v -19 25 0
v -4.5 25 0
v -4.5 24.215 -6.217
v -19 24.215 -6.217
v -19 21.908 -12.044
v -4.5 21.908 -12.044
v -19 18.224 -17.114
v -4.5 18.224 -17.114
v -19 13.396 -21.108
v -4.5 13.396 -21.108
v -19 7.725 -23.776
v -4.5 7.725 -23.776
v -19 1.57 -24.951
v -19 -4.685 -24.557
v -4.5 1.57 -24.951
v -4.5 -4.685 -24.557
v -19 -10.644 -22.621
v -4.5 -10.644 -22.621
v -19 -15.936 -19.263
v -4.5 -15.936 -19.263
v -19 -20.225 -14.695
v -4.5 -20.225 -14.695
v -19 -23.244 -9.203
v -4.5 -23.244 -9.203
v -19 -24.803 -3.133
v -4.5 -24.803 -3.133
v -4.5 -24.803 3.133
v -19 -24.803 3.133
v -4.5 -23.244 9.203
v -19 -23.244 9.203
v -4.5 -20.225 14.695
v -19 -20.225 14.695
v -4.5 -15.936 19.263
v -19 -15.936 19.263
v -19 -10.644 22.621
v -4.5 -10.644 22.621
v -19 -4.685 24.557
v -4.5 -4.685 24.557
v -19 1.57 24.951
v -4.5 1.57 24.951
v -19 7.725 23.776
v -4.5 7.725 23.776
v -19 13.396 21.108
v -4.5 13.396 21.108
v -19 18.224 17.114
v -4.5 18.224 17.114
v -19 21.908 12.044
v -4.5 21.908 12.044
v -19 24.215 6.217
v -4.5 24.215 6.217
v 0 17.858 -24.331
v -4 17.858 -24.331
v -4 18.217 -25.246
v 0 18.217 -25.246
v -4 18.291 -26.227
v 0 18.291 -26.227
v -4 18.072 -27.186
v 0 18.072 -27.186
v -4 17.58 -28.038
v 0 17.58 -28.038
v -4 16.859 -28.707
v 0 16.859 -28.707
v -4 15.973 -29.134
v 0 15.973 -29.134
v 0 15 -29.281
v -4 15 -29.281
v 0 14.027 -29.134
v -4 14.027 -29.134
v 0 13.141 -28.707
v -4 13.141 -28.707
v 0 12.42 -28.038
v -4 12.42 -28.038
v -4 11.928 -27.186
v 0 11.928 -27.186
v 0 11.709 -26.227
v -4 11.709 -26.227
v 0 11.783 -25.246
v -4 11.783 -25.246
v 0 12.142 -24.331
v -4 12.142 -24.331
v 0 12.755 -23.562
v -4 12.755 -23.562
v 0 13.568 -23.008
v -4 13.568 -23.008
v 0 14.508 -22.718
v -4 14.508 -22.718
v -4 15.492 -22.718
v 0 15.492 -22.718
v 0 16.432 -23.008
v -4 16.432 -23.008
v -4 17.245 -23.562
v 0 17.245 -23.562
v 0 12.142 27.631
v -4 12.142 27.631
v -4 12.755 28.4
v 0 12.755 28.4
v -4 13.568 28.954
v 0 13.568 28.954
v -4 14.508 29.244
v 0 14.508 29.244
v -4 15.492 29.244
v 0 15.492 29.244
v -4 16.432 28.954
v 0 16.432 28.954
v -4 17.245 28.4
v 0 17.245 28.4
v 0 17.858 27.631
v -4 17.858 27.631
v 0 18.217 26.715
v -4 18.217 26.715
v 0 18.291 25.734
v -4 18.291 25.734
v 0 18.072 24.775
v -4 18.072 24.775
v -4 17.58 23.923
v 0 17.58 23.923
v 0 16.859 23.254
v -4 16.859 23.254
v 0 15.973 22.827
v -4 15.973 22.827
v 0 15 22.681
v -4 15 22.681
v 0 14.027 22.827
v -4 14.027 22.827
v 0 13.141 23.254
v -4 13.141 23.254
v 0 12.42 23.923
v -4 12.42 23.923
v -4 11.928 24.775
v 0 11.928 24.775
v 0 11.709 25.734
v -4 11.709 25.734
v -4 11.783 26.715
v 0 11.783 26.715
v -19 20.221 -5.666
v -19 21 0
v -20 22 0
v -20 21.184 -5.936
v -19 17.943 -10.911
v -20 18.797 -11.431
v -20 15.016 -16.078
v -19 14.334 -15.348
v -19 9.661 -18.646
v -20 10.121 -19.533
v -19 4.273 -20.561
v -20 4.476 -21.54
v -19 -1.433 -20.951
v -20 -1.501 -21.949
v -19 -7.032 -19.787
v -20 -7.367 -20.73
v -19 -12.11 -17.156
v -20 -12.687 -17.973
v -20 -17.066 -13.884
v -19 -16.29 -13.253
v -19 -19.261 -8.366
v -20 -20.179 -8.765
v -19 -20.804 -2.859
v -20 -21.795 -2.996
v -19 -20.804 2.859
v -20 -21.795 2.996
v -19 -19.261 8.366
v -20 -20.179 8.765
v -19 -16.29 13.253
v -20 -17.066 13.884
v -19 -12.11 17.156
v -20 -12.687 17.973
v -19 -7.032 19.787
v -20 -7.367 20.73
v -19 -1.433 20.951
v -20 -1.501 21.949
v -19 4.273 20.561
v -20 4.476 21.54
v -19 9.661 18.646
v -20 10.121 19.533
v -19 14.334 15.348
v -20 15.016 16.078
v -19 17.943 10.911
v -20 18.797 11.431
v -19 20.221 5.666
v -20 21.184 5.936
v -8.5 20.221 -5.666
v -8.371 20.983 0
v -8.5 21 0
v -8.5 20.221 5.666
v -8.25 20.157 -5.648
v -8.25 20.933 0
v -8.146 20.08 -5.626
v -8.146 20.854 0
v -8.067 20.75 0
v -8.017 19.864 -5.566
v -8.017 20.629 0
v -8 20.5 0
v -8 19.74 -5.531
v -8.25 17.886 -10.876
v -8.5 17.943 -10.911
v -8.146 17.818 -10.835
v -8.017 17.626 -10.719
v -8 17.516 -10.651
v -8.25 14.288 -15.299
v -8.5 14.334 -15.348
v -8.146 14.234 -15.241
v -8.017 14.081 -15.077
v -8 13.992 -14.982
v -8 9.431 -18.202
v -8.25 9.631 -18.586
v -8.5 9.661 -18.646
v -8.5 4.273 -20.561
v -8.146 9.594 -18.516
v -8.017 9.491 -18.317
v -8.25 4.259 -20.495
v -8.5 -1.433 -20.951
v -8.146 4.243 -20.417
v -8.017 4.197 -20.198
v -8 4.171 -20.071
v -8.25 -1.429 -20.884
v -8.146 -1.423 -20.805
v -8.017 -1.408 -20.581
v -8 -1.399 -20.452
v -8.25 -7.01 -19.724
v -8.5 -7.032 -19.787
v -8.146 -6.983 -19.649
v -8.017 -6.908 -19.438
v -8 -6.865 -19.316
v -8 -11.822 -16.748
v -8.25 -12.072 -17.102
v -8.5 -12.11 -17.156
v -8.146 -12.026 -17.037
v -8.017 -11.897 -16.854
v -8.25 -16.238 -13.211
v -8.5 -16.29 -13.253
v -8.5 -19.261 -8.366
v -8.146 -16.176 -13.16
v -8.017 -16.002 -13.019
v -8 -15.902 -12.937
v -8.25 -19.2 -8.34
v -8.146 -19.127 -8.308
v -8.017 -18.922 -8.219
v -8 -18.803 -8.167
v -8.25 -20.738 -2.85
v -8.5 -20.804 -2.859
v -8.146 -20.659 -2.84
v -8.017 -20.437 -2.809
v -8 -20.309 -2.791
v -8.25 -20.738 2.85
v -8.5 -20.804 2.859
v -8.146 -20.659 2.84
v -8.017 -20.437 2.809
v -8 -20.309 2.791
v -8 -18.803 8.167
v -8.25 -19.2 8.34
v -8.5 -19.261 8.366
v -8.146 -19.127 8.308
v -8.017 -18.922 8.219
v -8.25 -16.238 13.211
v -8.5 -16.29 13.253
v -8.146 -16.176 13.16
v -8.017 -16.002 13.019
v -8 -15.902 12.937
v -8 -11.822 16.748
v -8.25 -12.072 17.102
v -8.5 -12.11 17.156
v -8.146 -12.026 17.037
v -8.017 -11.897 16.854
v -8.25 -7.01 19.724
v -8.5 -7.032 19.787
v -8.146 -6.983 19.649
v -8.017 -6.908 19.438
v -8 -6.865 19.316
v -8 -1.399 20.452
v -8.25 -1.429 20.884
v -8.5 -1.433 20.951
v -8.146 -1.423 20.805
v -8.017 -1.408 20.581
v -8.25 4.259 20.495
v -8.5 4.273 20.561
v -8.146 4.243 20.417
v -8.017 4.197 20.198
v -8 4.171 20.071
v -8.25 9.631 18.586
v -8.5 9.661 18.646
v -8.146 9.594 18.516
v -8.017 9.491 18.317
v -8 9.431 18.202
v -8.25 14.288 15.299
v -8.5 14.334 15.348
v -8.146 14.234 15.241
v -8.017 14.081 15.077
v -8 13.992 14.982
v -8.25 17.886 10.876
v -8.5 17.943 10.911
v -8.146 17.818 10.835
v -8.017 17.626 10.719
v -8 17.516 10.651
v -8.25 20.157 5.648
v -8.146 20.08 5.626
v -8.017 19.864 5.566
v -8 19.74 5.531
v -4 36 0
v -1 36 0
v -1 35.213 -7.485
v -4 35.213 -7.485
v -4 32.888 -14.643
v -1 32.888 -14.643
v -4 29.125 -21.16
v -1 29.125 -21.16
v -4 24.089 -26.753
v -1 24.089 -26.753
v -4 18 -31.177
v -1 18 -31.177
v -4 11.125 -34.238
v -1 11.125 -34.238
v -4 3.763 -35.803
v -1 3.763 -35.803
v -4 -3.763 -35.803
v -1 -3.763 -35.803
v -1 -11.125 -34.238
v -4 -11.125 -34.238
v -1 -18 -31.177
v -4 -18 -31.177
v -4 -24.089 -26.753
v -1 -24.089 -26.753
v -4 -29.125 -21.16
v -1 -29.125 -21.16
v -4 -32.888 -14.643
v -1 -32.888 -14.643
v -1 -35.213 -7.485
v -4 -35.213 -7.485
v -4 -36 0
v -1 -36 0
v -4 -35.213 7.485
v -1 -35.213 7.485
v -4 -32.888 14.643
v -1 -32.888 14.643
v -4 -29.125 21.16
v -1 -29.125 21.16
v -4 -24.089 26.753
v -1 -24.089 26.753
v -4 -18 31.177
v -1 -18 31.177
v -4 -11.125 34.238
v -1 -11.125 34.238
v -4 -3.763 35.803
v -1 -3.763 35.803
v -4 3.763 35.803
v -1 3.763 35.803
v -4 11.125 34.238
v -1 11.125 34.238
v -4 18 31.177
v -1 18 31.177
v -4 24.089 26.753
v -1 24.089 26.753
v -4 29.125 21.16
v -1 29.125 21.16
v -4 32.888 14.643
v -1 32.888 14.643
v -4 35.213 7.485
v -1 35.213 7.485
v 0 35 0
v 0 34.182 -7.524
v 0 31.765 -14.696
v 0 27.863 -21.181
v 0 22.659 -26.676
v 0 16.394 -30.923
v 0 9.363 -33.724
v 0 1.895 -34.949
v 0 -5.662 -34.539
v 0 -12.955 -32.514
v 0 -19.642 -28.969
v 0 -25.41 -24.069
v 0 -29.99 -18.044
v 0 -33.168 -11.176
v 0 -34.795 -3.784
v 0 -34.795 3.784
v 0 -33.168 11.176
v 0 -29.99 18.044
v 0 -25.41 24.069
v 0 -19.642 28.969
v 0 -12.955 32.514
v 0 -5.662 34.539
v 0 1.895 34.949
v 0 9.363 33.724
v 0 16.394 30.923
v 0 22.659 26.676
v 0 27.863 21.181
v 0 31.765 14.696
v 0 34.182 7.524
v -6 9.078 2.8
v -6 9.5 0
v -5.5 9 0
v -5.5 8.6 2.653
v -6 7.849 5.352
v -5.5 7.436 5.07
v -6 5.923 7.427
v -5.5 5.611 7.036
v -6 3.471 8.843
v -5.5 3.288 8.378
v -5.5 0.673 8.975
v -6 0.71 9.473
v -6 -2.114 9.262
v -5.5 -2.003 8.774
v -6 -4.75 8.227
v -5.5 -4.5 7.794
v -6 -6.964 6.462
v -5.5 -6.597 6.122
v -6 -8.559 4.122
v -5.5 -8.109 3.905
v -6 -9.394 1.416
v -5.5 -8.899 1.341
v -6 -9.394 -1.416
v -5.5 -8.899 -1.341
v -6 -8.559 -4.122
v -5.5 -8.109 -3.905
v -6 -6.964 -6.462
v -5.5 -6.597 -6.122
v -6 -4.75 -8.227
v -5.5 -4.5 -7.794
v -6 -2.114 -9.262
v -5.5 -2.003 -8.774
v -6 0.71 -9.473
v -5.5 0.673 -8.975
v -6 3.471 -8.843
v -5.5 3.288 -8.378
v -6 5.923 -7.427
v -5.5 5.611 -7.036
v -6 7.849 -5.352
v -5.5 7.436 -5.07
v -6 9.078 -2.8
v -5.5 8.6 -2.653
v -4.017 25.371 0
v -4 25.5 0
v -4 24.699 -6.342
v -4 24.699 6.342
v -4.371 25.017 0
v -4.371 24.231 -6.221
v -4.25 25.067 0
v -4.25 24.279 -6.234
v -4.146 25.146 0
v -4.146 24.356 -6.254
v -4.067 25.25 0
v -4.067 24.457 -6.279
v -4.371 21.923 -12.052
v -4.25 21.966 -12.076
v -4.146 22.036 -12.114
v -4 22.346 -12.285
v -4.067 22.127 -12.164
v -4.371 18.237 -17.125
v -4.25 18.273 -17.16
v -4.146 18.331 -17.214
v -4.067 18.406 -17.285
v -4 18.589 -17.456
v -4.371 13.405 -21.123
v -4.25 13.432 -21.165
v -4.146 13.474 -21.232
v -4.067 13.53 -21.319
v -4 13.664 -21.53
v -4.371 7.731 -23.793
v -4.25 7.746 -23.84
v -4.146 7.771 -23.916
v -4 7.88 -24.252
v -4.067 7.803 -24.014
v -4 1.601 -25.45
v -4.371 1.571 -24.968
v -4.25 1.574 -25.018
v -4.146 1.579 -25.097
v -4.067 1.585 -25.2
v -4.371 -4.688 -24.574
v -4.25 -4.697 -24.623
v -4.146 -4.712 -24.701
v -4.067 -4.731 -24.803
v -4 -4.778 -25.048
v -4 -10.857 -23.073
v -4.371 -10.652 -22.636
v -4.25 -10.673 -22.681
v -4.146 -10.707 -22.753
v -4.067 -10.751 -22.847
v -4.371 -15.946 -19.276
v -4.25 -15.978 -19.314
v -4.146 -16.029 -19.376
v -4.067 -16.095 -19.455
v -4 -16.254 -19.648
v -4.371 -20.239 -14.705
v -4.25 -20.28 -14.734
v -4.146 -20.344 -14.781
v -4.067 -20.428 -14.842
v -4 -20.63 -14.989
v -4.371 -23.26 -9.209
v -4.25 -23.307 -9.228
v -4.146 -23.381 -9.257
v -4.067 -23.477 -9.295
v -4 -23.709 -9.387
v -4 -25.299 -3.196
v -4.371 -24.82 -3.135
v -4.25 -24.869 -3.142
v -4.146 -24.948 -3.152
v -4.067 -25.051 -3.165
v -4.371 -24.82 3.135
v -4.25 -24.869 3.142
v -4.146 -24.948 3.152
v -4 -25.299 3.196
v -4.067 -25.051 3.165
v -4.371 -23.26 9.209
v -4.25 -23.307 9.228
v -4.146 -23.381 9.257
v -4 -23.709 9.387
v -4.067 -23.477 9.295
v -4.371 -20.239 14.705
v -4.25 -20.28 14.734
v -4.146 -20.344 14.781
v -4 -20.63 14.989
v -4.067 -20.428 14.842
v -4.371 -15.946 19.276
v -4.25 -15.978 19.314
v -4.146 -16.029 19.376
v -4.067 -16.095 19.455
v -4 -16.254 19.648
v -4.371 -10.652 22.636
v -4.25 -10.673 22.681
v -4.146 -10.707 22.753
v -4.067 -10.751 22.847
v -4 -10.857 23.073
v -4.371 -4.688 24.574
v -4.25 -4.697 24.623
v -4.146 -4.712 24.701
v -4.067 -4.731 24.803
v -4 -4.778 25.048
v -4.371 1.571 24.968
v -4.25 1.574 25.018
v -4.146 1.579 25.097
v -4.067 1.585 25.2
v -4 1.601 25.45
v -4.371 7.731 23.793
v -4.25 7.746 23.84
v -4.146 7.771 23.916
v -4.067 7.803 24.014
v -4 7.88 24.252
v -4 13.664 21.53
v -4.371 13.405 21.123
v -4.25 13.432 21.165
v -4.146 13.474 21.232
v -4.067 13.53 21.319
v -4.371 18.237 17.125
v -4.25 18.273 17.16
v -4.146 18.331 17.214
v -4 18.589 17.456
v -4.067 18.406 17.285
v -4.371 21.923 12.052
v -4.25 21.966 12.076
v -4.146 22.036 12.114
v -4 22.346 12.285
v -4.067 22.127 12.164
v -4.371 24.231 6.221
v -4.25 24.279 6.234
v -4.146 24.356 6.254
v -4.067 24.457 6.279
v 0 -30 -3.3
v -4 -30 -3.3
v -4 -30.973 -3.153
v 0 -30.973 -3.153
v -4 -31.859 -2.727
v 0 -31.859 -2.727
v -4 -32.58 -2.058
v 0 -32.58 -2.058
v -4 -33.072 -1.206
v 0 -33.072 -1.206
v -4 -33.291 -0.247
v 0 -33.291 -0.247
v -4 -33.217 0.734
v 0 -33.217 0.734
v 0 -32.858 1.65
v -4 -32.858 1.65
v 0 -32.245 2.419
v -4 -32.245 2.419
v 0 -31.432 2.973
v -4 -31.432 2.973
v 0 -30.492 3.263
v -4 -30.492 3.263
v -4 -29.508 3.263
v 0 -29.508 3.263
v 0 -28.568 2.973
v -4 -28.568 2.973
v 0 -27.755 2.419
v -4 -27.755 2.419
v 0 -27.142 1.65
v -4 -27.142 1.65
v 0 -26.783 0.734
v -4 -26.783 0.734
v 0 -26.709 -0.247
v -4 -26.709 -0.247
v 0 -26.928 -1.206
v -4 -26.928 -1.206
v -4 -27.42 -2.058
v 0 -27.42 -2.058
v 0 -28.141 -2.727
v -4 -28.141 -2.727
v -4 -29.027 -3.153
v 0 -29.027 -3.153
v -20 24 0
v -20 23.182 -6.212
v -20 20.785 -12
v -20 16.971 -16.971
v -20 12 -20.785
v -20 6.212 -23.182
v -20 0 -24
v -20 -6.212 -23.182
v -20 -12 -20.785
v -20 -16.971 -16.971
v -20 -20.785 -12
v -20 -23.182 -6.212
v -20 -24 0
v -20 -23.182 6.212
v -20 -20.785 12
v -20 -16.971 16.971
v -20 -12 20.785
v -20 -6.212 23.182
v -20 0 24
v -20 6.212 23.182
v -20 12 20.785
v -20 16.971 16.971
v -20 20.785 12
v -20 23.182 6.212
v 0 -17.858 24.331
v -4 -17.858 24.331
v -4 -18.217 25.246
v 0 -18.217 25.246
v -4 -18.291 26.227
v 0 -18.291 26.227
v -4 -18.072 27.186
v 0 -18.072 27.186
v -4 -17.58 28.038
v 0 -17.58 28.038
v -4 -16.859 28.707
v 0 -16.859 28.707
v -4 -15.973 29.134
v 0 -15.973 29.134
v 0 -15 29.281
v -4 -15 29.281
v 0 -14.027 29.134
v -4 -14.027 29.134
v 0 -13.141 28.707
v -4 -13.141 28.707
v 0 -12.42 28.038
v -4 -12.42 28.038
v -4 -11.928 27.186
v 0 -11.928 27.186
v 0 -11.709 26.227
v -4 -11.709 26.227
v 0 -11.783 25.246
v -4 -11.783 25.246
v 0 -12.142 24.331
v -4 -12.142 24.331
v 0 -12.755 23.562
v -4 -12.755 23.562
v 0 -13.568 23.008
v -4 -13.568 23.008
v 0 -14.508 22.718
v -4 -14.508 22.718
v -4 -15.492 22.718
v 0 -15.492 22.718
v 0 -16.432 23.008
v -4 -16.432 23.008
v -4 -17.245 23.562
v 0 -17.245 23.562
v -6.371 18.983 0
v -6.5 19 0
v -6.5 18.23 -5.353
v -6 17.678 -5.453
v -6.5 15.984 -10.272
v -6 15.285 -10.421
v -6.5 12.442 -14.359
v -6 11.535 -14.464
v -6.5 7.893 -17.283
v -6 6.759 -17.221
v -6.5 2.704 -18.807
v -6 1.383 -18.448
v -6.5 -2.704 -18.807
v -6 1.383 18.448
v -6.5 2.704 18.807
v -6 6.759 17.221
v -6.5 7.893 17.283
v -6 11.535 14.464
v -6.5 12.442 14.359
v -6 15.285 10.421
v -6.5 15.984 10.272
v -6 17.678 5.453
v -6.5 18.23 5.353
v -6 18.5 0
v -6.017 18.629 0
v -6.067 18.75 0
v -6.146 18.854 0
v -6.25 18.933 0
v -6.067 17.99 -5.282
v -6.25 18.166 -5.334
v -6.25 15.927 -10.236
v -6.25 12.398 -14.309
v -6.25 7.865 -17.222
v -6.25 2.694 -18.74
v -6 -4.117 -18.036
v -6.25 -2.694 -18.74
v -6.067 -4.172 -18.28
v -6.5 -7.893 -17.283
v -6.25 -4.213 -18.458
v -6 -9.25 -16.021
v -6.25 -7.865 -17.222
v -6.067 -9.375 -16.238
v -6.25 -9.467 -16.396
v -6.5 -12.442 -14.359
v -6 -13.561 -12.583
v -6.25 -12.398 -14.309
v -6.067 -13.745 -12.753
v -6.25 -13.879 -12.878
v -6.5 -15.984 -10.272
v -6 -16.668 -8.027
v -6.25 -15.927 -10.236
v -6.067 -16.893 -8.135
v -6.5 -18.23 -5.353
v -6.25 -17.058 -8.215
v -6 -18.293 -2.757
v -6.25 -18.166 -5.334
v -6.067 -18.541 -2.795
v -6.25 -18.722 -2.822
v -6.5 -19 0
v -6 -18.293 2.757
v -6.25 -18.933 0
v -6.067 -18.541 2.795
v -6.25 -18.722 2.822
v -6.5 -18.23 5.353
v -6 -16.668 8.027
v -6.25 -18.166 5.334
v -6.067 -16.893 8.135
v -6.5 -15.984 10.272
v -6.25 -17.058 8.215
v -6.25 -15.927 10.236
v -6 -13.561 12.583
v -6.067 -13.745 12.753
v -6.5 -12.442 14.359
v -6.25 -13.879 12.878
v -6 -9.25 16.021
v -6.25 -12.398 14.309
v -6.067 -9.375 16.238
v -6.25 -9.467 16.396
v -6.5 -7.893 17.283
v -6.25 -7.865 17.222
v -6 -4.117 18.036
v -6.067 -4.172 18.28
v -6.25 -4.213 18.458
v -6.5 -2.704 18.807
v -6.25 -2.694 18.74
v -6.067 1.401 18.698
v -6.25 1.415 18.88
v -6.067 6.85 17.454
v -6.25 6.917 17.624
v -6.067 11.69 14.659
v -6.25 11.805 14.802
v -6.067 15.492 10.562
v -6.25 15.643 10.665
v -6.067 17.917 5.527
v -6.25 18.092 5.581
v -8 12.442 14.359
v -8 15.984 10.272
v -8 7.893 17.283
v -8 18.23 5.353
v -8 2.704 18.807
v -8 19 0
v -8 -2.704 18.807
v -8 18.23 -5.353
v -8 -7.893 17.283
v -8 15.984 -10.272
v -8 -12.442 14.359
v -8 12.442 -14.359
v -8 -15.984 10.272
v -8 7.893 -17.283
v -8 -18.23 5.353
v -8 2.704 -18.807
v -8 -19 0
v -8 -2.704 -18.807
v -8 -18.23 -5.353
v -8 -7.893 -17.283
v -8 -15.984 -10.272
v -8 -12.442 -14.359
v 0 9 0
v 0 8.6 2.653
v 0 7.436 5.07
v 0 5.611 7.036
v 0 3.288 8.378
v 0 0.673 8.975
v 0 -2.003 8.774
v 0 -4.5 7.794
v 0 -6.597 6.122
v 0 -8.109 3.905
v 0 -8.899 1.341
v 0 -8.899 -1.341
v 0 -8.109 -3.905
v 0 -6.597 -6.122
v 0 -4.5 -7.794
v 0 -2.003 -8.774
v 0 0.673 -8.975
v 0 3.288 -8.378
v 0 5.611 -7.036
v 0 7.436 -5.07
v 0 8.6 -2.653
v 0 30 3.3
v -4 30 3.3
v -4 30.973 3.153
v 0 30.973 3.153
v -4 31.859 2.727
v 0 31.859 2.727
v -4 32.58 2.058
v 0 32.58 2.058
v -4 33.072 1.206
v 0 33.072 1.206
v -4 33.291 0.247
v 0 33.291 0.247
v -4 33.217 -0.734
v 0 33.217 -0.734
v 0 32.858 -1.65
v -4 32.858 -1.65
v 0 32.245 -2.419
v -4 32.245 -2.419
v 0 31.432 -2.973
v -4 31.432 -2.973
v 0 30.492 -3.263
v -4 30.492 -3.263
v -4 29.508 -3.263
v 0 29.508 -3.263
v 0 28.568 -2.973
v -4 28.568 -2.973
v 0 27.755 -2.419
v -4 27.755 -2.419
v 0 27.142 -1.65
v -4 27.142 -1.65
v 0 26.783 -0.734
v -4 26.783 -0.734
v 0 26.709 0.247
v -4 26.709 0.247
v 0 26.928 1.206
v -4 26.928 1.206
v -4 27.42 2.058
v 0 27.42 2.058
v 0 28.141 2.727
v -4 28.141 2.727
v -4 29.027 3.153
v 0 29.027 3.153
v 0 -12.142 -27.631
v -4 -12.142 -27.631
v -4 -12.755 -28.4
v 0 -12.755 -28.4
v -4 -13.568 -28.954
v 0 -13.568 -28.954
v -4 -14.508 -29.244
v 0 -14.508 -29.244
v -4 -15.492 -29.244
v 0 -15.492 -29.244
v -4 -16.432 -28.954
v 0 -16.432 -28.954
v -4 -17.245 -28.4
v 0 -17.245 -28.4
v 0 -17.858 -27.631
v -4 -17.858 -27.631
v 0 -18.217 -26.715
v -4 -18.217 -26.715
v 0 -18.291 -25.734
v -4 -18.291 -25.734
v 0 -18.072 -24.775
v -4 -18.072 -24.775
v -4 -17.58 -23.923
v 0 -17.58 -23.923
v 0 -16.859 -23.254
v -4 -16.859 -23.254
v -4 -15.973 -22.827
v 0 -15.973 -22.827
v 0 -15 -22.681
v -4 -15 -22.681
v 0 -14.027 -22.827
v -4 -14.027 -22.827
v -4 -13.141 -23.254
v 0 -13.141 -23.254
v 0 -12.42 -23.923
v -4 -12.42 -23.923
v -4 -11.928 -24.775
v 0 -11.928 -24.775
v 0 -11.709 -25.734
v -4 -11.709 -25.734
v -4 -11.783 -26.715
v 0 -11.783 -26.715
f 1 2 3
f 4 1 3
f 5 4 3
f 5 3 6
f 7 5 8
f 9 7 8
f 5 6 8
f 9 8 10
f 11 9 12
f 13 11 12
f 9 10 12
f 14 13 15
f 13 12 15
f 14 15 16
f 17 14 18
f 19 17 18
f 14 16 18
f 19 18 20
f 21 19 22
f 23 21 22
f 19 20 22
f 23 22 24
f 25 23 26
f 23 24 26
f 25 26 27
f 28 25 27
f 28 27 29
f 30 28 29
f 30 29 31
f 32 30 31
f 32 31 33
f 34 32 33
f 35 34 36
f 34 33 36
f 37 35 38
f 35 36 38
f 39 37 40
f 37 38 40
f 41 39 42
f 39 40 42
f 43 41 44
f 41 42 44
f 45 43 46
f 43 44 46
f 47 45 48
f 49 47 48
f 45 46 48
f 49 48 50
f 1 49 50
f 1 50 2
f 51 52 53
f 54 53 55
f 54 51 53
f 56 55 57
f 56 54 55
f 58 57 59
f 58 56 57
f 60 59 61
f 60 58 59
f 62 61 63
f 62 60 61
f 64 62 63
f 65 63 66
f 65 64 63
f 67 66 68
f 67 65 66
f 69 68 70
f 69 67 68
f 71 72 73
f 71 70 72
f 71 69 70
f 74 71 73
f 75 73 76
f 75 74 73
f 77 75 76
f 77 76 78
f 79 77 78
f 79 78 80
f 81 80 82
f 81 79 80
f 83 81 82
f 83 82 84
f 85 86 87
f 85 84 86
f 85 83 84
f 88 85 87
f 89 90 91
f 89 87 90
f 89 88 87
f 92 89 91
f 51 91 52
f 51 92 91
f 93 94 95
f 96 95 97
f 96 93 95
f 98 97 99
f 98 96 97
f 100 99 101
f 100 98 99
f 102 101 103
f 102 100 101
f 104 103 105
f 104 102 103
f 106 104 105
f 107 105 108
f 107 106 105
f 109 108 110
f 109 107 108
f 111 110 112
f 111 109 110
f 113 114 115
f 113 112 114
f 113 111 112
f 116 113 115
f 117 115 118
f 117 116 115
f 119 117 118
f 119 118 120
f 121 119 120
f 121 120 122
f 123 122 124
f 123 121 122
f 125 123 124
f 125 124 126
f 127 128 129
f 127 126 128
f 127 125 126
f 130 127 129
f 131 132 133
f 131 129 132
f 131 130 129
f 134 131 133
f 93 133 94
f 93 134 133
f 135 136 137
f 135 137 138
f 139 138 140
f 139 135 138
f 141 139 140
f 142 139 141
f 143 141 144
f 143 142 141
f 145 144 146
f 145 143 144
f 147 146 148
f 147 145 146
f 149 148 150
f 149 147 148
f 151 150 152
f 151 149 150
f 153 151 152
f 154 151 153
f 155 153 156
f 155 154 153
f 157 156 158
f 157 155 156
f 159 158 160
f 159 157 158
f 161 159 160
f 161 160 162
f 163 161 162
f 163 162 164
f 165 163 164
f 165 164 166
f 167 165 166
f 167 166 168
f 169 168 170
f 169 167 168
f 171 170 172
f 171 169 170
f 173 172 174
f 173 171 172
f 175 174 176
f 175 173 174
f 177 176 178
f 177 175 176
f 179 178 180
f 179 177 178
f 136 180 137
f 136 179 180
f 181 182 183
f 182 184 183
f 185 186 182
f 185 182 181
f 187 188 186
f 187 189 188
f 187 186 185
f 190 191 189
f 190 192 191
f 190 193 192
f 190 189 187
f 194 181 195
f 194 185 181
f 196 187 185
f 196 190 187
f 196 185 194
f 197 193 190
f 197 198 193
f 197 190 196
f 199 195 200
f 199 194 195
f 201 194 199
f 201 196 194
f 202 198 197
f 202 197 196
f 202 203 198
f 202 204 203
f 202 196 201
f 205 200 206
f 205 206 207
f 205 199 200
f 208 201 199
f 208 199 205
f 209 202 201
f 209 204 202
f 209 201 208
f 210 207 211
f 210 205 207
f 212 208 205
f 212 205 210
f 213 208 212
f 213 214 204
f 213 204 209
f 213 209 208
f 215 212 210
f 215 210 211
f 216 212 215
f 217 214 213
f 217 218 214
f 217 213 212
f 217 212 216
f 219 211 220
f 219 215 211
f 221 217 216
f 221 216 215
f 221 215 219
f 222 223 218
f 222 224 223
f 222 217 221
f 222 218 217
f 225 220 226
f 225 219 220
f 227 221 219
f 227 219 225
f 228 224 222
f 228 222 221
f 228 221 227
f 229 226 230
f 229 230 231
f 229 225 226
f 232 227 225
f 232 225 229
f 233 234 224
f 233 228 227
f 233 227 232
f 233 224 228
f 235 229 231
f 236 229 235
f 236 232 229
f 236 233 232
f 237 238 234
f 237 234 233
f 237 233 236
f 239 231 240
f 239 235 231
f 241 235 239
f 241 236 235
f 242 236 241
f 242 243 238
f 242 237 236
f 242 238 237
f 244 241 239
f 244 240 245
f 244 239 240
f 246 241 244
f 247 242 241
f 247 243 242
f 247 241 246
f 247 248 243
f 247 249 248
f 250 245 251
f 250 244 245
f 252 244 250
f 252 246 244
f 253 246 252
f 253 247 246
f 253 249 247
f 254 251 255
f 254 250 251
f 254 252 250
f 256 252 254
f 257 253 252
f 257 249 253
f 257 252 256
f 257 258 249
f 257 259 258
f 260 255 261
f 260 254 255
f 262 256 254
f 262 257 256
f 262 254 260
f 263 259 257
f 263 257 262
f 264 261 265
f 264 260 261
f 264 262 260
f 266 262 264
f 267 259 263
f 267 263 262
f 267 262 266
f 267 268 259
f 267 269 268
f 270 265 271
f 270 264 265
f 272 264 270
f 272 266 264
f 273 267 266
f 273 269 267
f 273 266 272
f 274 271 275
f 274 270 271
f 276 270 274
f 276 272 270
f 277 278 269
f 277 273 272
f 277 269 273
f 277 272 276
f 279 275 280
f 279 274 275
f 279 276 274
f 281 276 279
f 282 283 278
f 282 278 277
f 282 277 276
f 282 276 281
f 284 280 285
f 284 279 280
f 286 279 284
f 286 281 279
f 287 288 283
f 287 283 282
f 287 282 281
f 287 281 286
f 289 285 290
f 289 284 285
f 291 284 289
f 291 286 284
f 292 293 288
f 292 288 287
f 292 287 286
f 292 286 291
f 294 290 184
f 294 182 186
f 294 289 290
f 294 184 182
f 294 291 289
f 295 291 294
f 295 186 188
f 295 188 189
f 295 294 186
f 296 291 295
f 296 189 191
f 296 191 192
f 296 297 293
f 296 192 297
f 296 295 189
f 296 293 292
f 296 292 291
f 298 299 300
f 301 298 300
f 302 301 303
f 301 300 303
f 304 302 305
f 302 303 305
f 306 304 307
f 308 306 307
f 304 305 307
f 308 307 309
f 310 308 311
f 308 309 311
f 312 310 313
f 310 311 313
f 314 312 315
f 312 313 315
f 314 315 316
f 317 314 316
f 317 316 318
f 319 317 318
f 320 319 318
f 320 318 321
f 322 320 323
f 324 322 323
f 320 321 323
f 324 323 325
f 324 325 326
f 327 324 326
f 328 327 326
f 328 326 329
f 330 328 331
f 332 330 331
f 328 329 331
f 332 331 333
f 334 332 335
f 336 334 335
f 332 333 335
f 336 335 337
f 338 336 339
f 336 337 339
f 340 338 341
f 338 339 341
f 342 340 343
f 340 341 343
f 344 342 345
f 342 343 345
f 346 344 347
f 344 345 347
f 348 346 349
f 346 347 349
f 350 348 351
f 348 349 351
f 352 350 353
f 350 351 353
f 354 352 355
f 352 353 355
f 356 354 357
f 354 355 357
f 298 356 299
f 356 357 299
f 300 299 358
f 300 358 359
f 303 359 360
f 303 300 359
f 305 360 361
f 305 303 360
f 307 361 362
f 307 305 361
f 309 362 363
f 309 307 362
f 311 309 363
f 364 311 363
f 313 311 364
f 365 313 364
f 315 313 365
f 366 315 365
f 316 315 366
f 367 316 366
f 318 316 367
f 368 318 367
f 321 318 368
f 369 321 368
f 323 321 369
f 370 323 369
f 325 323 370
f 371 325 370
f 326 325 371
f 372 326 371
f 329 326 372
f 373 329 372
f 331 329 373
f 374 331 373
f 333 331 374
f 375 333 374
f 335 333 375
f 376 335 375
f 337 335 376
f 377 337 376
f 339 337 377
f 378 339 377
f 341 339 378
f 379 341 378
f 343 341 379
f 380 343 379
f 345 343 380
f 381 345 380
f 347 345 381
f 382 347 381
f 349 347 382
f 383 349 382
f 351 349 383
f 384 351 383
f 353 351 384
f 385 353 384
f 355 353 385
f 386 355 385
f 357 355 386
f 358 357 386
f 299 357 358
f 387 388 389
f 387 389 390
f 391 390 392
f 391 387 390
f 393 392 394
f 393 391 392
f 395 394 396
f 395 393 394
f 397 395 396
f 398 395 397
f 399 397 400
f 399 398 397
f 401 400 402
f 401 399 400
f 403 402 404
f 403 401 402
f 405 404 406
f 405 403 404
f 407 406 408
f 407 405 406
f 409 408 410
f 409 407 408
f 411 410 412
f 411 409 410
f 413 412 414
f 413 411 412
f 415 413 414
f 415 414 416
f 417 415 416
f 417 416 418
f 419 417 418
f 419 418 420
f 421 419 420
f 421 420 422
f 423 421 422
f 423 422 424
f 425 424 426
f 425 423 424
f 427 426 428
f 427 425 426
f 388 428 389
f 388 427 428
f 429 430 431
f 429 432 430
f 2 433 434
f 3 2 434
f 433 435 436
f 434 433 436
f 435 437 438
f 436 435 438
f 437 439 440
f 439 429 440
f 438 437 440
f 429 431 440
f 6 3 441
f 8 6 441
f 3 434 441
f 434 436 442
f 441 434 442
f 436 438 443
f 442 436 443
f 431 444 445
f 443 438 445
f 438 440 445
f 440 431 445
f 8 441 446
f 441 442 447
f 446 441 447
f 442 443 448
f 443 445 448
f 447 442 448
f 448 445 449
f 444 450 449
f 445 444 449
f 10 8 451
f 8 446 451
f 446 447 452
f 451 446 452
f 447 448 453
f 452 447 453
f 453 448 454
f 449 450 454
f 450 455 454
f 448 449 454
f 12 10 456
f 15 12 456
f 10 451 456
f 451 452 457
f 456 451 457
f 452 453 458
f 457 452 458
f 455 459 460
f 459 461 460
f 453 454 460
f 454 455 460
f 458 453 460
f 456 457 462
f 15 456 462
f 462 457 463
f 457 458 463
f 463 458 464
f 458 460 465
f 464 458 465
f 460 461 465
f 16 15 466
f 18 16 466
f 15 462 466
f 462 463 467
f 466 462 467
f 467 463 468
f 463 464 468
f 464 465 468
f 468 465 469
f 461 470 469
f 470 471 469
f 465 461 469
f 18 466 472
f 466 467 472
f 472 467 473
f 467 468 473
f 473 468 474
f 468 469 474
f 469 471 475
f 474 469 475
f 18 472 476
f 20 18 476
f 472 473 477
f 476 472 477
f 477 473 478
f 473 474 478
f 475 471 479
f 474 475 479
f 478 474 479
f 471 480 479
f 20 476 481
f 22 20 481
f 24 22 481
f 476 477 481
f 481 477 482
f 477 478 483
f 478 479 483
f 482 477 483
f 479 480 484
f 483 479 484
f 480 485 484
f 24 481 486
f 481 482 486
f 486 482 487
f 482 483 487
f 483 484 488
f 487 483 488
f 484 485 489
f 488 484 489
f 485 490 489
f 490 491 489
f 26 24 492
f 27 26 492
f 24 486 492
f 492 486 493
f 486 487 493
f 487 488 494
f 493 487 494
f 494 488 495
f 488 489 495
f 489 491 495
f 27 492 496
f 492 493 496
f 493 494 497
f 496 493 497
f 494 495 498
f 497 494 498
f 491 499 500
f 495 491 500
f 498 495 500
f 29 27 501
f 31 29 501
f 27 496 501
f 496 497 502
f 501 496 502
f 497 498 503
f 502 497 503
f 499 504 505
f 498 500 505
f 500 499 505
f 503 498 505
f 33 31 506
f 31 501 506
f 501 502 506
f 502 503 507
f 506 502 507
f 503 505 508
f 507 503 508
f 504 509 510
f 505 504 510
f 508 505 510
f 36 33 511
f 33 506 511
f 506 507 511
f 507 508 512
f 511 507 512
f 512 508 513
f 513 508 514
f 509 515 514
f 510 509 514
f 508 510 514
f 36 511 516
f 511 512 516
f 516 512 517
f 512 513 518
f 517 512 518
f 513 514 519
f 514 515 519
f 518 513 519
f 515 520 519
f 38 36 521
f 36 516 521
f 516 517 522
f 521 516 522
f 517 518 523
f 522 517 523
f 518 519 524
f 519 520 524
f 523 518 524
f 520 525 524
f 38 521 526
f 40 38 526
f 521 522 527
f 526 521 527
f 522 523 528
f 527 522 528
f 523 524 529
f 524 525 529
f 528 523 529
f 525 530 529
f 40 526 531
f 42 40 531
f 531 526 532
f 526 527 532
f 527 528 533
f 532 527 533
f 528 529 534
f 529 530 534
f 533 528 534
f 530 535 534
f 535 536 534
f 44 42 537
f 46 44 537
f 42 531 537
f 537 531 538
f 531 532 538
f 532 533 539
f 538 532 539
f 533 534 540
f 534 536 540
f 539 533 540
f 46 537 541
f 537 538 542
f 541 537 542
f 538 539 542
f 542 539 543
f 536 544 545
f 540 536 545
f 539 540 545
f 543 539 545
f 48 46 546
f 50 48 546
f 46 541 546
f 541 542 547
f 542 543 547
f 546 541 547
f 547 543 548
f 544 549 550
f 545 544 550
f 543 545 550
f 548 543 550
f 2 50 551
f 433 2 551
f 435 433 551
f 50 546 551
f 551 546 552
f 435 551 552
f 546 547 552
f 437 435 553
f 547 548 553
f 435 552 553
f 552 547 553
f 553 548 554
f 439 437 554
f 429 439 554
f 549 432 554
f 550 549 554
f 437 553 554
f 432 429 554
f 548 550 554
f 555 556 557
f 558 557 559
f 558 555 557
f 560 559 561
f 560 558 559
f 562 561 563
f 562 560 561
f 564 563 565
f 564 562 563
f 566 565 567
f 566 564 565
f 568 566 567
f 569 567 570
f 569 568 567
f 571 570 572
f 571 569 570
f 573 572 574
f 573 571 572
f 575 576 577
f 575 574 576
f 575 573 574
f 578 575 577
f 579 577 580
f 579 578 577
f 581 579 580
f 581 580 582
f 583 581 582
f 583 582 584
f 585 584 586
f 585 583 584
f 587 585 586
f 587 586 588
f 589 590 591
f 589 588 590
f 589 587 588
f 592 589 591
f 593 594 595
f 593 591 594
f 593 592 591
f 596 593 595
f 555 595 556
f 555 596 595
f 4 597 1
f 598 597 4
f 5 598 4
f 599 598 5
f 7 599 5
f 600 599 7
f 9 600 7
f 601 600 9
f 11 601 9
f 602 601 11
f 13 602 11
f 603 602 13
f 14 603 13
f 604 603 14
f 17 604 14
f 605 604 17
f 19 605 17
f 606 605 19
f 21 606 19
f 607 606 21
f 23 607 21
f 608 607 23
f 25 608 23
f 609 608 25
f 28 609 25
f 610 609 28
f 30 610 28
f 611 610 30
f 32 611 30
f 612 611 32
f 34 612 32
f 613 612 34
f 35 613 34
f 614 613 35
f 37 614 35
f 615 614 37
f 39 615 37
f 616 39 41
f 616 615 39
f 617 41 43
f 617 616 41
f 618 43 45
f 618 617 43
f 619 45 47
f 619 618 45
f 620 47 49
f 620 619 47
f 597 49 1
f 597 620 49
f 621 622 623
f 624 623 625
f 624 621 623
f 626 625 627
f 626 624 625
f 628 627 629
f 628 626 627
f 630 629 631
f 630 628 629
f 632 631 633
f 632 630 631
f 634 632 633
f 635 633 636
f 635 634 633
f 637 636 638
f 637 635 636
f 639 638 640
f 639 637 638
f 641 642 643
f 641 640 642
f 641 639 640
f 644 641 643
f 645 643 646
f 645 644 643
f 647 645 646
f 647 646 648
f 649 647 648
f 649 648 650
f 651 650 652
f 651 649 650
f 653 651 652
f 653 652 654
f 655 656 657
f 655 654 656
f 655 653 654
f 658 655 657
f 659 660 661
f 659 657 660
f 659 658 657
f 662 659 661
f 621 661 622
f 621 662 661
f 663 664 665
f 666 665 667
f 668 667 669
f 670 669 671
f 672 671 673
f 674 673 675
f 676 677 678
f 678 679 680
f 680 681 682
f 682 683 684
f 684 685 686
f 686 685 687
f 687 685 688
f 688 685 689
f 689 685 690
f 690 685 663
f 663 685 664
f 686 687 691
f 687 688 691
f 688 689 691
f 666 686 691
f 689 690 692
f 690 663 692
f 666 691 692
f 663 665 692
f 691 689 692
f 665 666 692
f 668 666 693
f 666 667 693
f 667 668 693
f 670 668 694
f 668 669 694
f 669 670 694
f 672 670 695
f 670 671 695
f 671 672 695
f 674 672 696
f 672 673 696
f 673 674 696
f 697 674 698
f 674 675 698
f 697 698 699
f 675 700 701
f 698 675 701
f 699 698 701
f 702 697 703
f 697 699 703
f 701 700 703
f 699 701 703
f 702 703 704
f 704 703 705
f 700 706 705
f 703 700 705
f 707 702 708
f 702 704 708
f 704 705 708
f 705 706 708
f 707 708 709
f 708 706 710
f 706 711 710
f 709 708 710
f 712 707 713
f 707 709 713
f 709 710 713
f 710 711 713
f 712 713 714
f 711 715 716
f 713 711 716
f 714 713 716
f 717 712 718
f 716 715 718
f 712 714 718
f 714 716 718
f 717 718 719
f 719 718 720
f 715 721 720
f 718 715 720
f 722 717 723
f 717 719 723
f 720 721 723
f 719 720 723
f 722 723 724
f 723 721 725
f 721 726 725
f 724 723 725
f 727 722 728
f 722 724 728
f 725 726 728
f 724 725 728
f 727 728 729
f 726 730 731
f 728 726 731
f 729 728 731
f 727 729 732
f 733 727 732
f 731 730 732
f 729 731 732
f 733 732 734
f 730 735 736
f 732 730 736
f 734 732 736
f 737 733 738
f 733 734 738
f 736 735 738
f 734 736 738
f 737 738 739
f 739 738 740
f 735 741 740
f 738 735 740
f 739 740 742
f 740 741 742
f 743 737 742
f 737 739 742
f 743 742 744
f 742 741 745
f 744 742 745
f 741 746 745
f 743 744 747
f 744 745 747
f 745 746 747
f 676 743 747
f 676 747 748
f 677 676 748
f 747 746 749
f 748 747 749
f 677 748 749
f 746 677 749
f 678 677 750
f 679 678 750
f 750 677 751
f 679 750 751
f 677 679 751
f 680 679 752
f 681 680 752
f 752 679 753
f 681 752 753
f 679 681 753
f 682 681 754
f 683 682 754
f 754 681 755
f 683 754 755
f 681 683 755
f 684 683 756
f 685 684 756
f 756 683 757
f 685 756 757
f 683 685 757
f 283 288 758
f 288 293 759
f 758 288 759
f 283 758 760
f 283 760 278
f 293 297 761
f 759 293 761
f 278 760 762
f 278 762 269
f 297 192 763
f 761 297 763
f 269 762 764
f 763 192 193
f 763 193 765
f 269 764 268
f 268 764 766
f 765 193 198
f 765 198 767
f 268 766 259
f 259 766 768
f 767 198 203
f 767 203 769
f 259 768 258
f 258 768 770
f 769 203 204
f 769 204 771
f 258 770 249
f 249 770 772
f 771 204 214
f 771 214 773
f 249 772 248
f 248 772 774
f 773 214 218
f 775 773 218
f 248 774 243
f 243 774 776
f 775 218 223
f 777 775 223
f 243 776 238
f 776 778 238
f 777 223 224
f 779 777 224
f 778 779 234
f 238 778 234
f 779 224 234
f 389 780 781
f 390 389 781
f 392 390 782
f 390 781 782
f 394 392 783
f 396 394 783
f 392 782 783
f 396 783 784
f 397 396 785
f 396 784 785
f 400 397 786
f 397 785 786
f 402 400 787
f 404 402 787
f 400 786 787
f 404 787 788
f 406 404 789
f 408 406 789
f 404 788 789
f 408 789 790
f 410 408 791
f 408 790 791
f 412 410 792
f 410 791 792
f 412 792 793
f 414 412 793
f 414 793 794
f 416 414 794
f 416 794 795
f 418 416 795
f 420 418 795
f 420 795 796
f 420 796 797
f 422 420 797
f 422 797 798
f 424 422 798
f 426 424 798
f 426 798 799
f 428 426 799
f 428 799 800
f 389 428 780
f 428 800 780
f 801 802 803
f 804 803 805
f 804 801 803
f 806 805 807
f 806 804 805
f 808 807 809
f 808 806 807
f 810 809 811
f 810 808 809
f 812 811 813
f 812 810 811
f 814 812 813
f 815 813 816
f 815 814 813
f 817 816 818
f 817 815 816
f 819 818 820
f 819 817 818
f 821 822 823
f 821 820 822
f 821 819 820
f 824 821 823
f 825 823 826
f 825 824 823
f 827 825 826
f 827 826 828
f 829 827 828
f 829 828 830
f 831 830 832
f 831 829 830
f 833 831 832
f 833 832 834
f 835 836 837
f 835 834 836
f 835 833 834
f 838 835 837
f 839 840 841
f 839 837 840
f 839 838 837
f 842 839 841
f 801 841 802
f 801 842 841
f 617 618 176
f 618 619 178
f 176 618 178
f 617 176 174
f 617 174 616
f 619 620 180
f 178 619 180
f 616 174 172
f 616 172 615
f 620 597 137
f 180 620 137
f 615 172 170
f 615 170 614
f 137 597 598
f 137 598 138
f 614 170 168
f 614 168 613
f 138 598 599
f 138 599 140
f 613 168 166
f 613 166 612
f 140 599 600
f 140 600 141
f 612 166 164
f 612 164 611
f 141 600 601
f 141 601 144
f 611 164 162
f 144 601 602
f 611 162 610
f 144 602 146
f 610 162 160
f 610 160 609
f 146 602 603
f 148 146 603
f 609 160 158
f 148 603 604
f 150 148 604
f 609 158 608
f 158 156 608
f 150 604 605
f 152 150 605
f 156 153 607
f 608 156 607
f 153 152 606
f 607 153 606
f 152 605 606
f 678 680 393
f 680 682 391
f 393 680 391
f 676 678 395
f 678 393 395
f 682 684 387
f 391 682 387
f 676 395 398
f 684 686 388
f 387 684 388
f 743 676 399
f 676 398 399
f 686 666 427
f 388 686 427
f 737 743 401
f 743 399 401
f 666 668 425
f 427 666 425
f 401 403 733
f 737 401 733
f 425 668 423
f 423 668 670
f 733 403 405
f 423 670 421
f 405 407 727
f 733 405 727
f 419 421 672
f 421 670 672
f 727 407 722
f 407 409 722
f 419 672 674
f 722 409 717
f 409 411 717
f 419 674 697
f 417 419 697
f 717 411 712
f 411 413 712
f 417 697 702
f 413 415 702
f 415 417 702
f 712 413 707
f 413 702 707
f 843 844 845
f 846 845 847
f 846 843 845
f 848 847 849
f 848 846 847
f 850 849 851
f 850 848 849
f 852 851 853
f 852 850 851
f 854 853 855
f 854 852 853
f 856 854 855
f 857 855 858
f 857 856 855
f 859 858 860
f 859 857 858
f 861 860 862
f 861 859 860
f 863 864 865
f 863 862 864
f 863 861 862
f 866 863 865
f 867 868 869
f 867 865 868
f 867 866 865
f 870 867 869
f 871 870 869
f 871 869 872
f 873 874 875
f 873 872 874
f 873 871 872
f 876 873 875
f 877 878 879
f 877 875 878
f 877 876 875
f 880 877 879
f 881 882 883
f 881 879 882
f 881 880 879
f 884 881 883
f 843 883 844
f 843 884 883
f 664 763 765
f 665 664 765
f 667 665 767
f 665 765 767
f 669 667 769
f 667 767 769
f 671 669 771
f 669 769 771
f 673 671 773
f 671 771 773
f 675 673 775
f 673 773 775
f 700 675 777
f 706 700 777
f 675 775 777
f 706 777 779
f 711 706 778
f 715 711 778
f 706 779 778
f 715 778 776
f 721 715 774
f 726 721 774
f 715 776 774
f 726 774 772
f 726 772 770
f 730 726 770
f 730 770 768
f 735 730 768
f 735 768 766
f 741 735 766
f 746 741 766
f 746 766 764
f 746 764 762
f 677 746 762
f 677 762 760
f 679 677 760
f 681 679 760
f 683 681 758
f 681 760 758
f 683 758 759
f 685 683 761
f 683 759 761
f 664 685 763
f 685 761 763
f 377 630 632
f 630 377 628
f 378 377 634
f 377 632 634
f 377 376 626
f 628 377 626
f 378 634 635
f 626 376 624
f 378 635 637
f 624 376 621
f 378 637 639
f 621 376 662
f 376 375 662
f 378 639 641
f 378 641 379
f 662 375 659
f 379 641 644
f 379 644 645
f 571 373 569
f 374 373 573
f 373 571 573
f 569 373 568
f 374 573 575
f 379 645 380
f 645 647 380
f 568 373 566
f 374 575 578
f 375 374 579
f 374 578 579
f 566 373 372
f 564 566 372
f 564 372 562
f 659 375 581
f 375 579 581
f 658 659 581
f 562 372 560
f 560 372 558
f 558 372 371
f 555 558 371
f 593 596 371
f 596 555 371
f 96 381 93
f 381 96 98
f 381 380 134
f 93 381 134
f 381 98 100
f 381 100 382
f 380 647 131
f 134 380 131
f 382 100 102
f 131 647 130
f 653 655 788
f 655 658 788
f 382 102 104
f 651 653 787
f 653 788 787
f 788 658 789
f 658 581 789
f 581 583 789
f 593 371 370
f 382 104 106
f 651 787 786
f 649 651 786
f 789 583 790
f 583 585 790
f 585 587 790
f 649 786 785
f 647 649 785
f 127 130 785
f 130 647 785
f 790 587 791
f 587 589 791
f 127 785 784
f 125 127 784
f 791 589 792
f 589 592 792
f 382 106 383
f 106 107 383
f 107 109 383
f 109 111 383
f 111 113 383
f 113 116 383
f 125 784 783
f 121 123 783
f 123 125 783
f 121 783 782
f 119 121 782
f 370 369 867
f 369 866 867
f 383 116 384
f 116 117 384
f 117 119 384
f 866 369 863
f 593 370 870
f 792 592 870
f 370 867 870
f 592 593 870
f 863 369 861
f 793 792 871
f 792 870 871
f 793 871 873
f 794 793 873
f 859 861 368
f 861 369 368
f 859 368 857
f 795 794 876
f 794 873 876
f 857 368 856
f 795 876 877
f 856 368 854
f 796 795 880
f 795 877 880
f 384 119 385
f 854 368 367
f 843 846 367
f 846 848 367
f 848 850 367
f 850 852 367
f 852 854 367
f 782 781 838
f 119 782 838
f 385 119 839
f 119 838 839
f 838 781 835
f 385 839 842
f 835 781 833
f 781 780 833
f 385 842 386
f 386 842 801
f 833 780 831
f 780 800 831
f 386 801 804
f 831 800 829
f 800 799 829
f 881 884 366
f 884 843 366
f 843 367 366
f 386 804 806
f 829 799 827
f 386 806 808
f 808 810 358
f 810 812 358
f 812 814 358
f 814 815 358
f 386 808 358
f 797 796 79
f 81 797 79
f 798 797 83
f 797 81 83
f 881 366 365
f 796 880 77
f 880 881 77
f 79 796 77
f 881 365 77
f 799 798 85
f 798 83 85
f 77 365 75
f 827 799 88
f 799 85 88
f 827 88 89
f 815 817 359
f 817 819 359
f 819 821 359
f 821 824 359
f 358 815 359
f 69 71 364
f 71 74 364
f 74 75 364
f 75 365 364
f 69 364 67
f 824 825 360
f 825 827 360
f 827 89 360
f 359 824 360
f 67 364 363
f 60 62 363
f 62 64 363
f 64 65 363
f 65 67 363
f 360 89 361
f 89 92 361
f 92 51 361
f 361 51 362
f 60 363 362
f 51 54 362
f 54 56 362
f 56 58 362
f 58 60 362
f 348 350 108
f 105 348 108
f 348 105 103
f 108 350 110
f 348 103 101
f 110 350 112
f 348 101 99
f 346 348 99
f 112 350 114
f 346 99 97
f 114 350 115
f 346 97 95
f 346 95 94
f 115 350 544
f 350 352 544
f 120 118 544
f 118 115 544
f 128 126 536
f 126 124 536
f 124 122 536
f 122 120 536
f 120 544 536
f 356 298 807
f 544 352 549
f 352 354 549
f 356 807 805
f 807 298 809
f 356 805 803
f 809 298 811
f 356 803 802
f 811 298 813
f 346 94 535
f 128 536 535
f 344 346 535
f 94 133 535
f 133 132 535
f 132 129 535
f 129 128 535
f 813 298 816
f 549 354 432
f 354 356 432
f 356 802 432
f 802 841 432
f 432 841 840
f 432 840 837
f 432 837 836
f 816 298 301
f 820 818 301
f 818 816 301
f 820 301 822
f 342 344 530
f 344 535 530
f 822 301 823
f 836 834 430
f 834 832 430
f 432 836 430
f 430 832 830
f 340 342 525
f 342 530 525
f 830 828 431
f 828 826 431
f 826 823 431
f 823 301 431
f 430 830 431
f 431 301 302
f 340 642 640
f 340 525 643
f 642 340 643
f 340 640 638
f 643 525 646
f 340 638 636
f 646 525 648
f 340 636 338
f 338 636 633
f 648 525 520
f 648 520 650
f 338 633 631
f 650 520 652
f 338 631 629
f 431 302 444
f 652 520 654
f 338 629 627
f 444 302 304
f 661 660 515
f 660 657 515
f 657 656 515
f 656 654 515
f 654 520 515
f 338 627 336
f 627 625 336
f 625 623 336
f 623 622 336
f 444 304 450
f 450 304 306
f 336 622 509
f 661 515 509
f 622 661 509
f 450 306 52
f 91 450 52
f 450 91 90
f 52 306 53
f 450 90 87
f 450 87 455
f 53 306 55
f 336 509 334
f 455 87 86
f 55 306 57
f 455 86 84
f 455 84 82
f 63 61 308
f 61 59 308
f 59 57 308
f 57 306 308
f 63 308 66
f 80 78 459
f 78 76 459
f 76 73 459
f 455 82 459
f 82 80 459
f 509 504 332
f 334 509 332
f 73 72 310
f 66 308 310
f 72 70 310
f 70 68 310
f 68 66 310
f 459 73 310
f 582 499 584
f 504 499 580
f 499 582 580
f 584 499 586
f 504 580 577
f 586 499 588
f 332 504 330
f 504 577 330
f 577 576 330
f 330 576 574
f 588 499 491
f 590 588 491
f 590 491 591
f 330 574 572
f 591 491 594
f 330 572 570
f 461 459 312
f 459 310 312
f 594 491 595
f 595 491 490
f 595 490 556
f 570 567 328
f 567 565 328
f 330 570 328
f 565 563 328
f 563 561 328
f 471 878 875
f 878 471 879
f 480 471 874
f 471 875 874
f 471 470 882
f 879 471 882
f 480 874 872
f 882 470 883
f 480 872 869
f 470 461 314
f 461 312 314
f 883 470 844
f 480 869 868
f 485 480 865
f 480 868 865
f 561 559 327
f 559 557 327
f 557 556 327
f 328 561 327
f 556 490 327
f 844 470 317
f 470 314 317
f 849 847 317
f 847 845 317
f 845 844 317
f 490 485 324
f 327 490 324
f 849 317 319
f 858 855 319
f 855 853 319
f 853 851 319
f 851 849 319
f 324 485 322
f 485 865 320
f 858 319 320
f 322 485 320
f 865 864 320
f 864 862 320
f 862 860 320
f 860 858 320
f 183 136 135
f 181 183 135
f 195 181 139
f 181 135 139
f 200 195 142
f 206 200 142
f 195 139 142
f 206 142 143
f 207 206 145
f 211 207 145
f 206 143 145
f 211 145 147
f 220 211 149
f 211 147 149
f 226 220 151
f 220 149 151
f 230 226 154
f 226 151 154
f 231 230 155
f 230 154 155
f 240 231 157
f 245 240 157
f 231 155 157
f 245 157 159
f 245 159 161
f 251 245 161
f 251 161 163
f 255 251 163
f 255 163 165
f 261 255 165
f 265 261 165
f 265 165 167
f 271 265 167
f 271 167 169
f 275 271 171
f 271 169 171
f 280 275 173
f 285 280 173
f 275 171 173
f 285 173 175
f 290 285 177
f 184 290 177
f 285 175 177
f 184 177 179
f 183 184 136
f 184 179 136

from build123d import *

# Parameters (mm, degrees)
SKETCH_2_W               = 20
SKETCH_2_H               = 9
CHAMFER_1_SIZE           = 1
FILLET_1_R               = 0.5
CHAMFER_2_SIZE           = 0.5
CHAMFER_3_SIZE           = 1
PATTERN_CIRCULAR_1_COUNT = 6


with BuildPart() as part:
    # Эскиз1 → Повернуть1 (revolve)
    with BuildSketch(Plane.XY):
        Polygon((0, 36), (0, 0), (-6, 0), (-6, 19), (-8, 19), (-8, 21), (-20, 21), (-20, 25), (-4, 25), (-4, 36), align=None)
    revolve(axis=Axis((0, 0, 0), (-1, 0, 0)))

    # Эскиз2 → Вырез-Повернуть1 (revolve, cut)
    with BuildSketch(Plane.XY):
        with Locations((-10, 4.5)):
            Rectangle(SKETCH_2_W, SKETCH_2_H)
    revolve(axis=Axis((0, 0, 0), (1, 0, 0)), mode=Mode.SUBTRACT)

    # Фаска1
    chamfer_1_edges = [part.edges().sort_by_distance(p)[0] for p in [
        (-20, -25, 0),
        (-20, -21, 0),
    ]]
    chamfer(chamfer_1_edges, length=CHAMFER_1_SIZE)

    # Скругление1
    fillet_1_edges = [part.edges().sort_by_distance(p)[0] for p in [
        (-6, -19, 0),
        (-4, -25, 0),
        (-8, -21, 0),
    ]]
    fillet(fillet_1_edges, radius=FILLET_1_R)

    # Фаска2
    chamfer_2_edges = [part.edges().sort_by_distance(p)[0] for p in [
        (-6, -9, 0),
    ]]
    chamfer(chamfer_2_edges, length=CHAMFER_2_SIZE)

    # Фаска3
    chamfer_3_edges = [part.edges().sort_by_distance(p)[0] for p in [
        (0, -36, 0),
    ]]
    chamfer(chamfer_3_edges, length=CHAMFER_3_SIZE)

    # Эскиз3 → Отверстие с зазором M61 (revolve, cut)
    with BuildSketch(Plane(origin=(0, -30, 0), x_dir=(0, 0, -1), z_dir=(0, 1, 0))):
        Polygon((0, 0), (0, 17.982840043), (3.3, 16), (3.3, 0), align=None)
    hole_wizard_m61 = revolve(axis=Axis((6.35, -30, 0), (-1, 0, 0)), mode=Mode.SUBTRACT)

    # Круговой массив1: Отверстие с зазором M61 ×6 about axis
    pattern_circular_1_axis = Axis((0, 0, 0), (1, 0, 0))
    for i in range(1, PATTERN_CIRCULAR_1_COUNT):
        add(hole_wizard_m61.rotate(pattern_circular_1_axis, i * 360 / PATTERN_CIRCULAR_1_COUNT), mode=Mode.SUBTRACT)


solid = part.part
